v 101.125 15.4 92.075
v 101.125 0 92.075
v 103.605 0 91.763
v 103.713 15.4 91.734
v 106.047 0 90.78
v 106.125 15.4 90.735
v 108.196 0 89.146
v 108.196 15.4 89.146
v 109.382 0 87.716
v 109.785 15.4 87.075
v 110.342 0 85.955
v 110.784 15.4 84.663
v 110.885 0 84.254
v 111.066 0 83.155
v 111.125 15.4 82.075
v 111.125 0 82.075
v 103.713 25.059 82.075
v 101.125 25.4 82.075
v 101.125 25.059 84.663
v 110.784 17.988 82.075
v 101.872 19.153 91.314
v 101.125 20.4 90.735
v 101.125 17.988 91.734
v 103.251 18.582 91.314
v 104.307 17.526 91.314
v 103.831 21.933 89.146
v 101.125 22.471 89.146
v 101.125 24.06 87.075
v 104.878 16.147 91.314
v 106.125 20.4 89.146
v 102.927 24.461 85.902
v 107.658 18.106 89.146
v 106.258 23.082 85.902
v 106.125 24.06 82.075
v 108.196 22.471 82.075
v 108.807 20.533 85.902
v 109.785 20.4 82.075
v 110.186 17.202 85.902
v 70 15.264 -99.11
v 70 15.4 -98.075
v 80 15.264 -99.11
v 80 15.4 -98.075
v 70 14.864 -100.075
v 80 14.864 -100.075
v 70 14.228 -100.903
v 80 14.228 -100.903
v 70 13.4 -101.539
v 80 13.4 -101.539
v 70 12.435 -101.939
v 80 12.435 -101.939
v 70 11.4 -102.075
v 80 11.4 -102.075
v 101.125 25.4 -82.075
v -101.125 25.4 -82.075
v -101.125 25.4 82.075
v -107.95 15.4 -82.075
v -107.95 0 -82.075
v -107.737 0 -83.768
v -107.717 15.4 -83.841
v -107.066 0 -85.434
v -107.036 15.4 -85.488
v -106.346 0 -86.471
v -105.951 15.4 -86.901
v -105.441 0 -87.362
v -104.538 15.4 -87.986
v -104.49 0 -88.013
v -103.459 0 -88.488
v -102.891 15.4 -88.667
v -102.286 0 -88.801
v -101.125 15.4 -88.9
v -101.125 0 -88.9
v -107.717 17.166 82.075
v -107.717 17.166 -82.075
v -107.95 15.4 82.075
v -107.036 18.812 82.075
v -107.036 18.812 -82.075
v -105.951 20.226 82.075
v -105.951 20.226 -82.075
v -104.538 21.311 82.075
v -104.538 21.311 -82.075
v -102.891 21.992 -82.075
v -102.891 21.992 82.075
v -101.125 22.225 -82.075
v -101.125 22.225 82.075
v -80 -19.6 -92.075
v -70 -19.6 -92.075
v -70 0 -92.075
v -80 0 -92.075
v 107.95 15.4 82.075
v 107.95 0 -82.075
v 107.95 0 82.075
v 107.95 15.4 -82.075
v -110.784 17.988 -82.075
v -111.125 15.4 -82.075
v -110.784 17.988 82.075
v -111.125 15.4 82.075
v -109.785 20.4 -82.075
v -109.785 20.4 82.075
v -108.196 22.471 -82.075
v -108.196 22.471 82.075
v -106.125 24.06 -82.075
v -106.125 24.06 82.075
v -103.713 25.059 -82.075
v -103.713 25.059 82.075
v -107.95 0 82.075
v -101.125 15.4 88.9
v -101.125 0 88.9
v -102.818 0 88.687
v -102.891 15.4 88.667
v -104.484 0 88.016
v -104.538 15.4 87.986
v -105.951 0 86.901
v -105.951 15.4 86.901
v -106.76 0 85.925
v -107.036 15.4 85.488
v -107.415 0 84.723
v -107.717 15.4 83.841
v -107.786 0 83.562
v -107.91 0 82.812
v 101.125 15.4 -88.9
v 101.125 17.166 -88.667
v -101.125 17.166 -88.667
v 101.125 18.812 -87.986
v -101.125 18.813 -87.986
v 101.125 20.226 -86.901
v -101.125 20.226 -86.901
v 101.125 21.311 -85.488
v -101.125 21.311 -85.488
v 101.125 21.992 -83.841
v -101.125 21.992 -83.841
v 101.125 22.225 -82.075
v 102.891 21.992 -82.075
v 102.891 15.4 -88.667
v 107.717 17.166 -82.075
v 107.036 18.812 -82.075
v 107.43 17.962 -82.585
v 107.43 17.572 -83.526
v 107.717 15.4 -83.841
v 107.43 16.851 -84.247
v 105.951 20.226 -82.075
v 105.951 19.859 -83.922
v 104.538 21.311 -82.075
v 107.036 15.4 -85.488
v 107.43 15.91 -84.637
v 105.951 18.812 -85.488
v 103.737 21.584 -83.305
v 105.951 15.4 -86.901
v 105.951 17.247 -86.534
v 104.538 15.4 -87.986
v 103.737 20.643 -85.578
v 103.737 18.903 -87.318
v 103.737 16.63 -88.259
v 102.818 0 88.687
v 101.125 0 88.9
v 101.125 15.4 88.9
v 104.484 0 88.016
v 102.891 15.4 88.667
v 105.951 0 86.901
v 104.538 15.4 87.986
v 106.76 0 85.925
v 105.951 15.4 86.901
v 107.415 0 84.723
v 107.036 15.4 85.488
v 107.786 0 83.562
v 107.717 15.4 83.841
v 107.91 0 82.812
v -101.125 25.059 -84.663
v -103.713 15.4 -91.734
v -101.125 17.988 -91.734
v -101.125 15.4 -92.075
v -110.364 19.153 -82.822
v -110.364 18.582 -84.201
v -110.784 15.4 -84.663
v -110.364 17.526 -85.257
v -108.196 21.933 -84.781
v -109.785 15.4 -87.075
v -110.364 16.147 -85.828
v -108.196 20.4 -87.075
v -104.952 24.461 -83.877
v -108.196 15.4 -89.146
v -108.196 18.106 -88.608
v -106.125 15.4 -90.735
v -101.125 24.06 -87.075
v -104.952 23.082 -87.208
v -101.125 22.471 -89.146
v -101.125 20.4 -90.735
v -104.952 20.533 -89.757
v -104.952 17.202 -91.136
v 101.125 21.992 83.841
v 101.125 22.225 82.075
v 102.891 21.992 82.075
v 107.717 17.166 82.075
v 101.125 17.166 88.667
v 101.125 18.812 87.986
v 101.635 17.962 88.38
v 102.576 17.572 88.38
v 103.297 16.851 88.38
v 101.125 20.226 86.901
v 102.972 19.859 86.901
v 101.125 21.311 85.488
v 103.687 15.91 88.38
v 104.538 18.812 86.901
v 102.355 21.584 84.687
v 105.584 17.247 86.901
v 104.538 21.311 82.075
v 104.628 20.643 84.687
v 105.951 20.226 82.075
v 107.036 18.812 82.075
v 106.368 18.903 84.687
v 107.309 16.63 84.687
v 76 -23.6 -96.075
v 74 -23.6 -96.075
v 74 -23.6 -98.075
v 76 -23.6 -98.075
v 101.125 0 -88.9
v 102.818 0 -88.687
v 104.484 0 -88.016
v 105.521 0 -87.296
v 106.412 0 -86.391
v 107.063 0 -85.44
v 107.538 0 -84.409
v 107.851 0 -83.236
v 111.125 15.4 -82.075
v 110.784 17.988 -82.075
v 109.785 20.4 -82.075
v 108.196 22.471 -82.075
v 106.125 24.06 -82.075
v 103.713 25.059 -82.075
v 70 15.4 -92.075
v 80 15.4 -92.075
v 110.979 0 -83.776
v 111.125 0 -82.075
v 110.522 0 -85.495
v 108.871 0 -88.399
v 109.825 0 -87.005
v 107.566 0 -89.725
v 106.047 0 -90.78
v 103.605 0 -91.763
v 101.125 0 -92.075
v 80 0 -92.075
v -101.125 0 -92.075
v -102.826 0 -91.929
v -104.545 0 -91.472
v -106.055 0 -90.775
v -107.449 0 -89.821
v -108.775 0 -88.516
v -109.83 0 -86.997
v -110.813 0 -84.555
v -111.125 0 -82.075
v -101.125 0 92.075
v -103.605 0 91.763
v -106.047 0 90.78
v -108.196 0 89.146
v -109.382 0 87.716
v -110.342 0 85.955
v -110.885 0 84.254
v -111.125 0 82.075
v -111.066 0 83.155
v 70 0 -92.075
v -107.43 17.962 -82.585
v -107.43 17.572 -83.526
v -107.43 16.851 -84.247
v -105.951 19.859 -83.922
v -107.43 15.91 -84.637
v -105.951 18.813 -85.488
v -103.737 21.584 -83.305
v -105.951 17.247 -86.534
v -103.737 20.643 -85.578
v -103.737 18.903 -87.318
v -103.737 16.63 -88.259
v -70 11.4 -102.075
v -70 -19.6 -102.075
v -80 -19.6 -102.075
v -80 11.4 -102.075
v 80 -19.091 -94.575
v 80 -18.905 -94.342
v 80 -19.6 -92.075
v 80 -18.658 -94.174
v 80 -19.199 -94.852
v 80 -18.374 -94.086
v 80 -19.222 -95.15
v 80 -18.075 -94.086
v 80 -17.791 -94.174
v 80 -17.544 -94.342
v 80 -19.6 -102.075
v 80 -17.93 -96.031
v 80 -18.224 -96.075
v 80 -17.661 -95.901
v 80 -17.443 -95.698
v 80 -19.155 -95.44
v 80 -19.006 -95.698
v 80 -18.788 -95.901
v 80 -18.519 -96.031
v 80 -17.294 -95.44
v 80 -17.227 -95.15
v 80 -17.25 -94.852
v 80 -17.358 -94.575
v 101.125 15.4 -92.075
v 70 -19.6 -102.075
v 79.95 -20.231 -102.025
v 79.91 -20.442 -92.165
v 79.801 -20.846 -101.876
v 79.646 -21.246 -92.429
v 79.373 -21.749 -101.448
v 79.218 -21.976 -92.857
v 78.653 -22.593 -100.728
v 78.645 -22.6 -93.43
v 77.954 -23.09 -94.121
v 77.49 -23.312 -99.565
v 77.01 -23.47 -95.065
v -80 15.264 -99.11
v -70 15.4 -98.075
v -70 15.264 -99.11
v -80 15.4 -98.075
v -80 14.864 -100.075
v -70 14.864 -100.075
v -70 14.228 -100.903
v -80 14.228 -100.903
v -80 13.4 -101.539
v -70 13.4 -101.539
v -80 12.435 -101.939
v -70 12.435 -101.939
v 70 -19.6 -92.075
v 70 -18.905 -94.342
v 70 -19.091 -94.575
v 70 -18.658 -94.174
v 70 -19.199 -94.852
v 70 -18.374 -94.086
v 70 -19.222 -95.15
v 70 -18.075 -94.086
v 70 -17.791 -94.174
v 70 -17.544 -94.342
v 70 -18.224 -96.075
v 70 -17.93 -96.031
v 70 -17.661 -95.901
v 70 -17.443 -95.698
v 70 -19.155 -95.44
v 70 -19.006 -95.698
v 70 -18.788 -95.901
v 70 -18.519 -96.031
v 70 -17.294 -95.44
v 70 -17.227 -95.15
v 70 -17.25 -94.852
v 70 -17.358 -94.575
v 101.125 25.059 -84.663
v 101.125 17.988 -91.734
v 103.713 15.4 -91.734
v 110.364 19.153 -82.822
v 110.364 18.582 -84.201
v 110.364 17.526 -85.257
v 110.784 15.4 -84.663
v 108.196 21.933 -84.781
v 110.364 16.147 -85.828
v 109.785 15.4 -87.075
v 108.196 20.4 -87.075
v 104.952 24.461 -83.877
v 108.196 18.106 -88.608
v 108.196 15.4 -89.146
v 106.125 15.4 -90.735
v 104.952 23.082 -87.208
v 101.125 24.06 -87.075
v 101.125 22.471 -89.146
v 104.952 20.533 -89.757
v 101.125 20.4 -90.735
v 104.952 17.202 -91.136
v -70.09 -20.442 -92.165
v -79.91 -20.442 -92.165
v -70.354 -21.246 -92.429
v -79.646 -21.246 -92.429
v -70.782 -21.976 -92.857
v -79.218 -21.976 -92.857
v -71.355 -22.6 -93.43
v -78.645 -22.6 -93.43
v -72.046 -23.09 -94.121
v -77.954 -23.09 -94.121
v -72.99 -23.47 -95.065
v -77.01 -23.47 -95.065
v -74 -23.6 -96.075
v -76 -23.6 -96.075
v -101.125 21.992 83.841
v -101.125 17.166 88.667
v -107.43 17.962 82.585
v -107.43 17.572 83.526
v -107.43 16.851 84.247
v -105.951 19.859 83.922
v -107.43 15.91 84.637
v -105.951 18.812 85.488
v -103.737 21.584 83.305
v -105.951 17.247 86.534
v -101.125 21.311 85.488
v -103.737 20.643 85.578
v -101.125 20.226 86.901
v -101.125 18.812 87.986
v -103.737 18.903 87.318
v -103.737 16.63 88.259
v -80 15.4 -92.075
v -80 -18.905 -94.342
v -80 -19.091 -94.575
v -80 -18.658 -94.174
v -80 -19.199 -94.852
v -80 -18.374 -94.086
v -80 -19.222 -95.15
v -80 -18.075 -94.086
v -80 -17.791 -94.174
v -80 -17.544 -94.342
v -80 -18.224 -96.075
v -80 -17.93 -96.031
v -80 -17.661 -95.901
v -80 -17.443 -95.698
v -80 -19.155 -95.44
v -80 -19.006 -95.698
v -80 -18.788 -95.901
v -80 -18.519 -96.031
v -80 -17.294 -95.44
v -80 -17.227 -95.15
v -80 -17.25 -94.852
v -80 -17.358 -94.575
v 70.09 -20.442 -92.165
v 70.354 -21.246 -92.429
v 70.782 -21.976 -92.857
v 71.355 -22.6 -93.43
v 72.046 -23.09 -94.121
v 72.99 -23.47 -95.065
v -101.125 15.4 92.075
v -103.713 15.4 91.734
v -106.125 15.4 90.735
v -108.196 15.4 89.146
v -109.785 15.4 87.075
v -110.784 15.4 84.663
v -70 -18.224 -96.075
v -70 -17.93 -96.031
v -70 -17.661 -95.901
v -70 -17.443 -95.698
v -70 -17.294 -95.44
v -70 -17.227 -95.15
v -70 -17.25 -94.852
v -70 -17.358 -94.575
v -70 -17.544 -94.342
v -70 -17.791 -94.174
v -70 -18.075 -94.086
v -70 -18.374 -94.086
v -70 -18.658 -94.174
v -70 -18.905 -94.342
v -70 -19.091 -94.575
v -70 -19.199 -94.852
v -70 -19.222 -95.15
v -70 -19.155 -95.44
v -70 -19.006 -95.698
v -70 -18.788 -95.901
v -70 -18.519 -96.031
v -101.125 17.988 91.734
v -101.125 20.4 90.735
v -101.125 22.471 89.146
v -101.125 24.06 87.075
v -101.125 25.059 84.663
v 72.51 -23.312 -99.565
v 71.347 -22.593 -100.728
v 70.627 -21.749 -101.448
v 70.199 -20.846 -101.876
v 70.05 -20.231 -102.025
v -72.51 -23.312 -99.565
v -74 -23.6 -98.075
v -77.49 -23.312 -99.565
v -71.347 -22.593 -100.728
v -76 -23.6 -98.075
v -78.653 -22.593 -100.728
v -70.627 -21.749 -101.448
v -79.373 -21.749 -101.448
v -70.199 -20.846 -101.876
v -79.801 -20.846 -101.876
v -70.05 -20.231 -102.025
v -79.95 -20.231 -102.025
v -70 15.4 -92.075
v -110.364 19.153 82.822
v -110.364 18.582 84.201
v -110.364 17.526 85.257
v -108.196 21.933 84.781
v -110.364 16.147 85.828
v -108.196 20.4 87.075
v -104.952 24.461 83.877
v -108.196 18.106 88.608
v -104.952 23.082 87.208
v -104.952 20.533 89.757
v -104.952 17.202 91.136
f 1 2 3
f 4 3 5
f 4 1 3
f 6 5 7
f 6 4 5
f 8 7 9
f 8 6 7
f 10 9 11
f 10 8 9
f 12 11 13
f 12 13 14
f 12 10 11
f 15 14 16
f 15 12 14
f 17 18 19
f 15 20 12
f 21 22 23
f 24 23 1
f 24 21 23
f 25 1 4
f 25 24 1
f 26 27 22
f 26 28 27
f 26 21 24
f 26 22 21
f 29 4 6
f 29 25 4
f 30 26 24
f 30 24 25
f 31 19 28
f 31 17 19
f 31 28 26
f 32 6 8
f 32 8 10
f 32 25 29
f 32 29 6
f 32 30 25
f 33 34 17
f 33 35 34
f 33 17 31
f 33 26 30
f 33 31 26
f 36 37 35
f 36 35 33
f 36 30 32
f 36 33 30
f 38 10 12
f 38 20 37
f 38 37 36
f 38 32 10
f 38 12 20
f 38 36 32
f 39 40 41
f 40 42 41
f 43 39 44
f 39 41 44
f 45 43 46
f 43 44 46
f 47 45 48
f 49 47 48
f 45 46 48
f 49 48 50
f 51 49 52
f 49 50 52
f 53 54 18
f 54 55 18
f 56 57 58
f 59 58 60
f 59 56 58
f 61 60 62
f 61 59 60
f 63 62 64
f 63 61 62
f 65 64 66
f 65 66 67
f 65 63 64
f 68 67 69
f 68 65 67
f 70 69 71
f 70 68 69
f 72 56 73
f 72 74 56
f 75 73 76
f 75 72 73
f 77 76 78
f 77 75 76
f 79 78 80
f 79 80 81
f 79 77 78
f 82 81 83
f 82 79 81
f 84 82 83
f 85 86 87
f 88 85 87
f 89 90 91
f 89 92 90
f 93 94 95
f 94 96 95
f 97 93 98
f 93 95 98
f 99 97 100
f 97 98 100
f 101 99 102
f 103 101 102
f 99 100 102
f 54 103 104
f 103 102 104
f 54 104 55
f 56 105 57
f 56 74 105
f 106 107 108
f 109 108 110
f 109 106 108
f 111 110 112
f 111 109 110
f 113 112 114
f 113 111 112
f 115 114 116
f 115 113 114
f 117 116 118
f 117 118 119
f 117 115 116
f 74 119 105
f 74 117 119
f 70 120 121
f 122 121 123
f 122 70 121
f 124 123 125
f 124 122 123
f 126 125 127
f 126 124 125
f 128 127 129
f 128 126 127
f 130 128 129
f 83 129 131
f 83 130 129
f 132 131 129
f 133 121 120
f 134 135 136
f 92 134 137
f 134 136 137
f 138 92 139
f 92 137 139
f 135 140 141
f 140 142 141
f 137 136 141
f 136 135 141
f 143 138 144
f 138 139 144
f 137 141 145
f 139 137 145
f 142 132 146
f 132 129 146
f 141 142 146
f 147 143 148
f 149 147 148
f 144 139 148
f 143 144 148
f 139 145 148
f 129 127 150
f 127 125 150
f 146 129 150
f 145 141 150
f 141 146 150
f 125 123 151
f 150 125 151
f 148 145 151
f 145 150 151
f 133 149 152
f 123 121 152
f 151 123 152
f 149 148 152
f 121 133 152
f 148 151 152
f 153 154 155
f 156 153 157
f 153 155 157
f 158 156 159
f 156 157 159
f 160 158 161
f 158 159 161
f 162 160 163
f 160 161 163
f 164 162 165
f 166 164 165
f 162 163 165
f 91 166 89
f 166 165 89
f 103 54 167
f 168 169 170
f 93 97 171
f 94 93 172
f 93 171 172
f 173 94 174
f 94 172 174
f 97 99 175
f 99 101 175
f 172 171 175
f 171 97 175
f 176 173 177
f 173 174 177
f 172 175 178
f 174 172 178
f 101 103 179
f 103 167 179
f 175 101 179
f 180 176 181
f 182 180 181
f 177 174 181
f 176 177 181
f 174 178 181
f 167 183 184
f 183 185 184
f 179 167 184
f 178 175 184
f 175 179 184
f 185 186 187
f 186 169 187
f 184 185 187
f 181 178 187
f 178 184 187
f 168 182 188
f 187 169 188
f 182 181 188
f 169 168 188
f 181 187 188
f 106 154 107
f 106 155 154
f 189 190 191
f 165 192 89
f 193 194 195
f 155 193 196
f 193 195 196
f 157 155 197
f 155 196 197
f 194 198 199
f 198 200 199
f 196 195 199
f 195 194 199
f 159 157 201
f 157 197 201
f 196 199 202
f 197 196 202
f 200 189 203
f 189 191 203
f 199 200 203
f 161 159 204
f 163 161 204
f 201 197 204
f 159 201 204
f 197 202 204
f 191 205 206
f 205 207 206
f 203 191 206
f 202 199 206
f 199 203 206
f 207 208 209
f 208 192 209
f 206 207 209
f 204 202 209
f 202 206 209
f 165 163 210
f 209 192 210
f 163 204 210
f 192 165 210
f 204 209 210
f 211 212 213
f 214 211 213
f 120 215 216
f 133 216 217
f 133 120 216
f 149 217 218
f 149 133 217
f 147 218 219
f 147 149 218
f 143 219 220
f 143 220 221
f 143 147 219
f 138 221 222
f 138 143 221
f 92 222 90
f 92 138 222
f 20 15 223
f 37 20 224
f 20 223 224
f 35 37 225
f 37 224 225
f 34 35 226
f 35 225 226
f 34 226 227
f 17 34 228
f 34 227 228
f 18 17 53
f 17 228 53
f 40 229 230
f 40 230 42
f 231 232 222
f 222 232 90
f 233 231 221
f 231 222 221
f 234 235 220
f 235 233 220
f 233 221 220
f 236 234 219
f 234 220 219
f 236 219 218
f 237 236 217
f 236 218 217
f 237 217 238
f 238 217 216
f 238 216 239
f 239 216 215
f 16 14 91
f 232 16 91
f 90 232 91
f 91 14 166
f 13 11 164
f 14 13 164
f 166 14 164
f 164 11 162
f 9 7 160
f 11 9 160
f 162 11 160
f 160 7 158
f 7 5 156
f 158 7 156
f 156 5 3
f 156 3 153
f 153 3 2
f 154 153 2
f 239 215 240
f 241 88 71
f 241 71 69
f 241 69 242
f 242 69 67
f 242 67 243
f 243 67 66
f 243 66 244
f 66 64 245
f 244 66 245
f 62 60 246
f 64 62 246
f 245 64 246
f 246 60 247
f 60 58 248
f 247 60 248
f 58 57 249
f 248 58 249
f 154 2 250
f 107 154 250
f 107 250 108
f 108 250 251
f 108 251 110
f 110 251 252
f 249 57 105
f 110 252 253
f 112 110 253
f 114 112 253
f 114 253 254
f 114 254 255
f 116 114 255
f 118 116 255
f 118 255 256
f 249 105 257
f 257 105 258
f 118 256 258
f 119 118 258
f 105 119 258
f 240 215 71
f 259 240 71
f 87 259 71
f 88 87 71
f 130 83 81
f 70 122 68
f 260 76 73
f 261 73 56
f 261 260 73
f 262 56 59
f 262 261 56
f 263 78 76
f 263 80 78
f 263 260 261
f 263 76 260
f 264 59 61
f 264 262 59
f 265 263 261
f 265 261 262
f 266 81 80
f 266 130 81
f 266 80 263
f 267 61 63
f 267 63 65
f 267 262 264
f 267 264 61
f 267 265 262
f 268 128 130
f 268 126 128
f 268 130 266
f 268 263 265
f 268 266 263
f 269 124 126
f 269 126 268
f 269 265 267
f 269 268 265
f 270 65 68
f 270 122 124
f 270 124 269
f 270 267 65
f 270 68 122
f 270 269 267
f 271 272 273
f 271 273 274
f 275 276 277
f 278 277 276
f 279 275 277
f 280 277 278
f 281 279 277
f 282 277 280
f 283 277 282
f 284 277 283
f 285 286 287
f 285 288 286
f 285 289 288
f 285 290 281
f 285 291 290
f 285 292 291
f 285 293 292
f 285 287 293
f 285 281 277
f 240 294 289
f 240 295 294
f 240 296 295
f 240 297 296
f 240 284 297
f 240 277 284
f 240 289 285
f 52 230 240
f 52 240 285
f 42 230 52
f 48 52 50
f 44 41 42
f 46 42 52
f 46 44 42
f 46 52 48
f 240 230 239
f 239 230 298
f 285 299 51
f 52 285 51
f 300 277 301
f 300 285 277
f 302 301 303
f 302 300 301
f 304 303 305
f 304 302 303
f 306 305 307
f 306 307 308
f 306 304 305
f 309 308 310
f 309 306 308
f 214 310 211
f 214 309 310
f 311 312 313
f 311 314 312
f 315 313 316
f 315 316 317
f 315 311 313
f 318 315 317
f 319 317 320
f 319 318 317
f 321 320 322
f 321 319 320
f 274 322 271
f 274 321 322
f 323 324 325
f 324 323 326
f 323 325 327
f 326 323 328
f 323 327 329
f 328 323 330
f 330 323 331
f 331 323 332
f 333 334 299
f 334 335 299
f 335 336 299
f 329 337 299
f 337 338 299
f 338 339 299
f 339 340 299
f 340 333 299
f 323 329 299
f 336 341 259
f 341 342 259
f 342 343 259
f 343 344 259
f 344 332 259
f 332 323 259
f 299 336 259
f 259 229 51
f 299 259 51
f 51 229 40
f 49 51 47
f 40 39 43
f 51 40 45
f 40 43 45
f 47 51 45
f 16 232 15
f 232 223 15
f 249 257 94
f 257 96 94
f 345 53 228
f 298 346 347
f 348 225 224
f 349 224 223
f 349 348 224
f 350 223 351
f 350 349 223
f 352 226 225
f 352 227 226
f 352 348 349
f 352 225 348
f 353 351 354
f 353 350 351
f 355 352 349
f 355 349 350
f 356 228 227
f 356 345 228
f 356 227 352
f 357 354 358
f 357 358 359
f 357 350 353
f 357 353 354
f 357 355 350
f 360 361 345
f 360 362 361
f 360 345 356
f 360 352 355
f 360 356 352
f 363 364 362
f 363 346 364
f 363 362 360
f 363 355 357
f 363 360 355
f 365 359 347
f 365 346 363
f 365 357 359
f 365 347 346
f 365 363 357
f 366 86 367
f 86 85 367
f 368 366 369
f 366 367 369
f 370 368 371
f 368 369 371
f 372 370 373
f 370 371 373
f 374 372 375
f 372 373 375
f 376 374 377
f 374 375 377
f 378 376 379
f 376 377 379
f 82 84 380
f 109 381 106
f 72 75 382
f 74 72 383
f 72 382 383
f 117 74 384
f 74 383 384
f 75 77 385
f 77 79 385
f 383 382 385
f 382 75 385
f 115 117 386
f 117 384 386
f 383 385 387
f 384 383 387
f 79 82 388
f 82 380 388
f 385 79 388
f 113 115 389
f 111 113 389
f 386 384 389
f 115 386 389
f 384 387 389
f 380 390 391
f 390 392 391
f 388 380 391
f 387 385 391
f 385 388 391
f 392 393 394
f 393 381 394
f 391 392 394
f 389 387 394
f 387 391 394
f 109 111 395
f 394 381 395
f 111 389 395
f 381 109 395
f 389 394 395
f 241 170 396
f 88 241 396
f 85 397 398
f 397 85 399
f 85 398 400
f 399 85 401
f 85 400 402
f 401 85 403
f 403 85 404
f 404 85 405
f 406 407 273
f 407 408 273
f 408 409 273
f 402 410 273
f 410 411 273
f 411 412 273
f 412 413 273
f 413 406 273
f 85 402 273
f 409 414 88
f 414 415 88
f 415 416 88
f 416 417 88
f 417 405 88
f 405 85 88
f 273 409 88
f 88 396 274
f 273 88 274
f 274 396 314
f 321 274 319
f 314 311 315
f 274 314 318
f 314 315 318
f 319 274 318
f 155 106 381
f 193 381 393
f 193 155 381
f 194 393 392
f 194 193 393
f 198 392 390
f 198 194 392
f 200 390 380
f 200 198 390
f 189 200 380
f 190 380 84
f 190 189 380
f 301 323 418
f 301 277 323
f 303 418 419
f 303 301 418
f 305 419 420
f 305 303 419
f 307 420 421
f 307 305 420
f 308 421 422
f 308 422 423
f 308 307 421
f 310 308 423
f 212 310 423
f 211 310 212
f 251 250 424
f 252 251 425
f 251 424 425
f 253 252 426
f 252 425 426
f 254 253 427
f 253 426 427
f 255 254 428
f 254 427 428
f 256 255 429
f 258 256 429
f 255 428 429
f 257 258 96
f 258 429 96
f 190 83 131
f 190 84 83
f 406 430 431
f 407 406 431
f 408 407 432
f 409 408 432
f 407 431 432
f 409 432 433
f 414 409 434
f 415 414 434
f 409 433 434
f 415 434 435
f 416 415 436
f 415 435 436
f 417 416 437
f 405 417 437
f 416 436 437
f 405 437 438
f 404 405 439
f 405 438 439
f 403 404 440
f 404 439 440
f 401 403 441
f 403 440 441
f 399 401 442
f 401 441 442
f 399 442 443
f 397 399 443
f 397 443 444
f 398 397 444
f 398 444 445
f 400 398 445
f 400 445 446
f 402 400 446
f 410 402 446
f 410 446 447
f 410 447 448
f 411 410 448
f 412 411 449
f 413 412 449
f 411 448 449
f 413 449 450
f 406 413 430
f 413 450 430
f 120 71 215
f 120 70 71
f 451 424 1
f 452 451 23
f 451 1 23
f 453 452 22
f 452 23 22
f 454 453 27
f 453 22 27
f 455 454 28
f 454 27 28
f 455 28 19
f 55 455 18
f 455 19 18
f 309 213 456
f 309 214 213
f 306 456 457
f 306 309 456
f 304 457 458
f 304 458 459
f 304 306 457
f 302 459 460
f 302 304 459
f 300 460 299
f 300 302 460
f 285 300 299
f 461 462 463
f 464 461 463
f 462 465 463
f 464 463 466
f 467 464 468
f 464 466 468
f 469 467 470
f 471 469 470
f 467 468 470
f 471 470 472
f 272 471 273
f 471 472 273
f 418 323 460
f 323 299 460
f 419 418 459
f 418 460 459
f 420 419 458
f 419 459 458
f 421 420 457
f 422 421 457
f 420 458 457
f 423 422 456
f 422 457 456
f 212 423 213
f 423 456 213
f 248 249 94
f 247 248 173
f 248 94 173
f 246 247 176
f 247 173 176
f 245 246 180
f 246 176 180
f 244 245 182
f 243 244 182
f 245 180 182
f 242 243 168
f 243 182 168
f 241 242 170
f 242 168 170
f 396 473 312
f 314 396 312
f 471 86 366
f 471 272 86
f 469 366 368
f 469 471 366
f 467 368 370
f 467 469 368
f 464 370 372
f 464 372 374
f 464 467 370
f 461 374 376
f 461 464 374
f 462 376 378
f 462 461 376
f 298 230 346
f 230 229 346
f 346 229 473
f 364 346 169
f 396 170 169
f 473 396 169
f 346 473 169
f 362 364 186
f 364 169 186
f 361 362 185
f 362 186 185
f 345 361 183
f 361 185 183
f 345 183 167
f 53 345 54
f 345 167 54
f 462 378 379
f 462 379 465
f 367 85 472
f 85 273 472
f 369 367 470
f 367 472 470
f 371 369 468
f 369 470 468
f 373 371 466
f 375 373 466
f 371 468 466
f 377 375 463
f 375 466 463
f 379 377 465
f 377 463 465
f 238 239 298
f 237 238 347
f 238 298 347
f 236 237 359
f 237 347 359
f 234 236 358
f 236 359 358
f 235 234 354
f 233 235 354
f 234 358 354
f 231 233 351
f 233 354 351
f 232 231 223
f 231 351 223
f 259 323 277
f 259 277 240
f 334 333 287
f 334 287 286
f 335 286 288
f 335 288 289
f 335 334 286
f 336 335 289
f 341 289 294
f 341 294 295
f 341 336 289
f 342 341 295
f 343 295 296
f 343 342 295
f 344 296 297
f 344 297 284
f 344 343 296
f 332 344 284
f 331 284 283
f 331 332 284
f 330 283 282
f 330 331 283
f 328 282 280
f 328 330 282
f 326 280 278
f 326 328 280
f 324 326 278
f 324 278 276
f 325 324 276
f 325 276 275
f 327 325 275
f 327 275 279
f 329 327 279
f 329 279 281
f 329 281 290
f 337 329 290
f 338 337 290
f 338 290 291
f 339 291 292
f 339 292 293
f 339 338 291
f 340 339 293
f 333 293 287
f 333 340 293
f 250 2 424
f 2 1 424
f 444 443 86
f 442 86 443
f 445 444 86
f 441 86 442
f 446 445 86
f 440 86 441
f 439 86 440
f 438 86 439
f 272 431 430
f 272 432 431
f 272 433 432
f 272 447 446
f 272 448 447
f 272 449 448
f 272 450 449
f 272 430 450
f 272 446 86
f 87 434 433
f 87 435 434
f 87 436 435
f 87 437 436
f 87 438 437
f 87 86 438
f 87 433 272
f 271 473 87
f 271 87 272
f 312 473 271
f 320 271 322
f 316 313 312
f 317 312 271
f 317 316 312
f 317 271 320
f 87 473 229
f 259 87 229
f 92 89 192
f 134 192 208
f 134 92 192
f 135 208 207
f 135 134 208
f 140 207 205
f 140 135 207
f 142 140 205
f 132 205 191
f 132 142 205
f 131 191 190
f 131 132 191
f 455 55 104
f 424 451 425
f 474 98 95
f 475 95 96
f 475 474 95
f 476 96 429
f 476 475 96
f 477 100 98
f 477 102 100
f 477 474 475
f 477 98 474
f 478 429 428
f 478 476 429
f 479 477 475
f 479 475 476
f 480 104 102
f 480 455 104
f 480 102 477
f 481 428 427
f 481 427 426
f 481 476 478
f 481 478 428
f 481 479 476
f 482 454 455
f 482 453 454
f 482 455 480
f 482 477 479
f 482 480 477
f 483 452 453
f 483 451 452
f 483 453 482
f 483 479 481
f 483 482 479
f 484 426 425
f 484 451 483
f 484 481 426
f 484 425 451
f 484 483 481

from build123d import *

# Parameters (mm, degrees)
FILLET1_R            = 10
SHELL1_T             = -3.175
SKETCH7_W            = 10
SKETCH7_H            = 39
SKETCH7_R            = 1
BOSS_EXTRUDE1_DEPTH  = 10
FILLET2_R            = 4
FILLET2_OF_MIRROR1_R = 4


with BuildPart() as part:
    # Sketch1 → Loft3 section 0
    with BuildSketch(Plane(origin=(0, 0, 0), x_dir=(1, 0, 0), z_dir=(0, 1, 0))):
        with BuildLine():
            Line((111.125, -92.075), (-111.125, -92.075))
            Line((-111.125, -92.075), (-111.125, 92.075))
            Line((-111.125, 92.075), (111.125, 92.075))
            Line((111.125, 92.075), (111.125, -92.075))
        make_face()
    # Sketch2 → Loft3 section 1
    with BuildSketch(Plane(origin=(0, 25.4, 0), x_dir=(1, 0, 0), z_dir=(0, 1, 0))):
        with BuildLine():
            Line((111.125, 92.075), (-111.125, 92.075))
            Line((-111.125, 92.075), (-111.125, -92.075))
            Line((-111.125, -92.075), (111.125, -92.075))
            Line((111.125, -92.075), (111.125, 92.075))
        make_face()
    loft()

    # Fillet1
    fillet1_edges = [part.edges().sort_by_distance(p)[0] for p in [
        (0, 25.4, -92.075),
        (111.125, 25.4, 0),
        (0, 25.4, 92.075),
        (-111.125, 25.4, 0),
        (111.125, 12.7, -92.075),
        (111.125, 12.7, 92.075),
        (-111.125, 12.7, -92.075),
        (-111.125, 12.7, 92.075),
    ]]
    fillet(fillet1_edges, radius=FILLET1_R)

    # Shell1
    shell1_openings = [part.faces().sort_by_distance(p)[0] for p in [
        (-6.8e-08, 0, 8.2e-08),
    ]]
    offset(amount=SHELL1_T, openings=shell1_openings)

    # Sketch7 → Boss-Extrude1 (add)
    with BuildSketch(Plane(origin=(70, 0, 0), x_dir=(0, 0, -1), z_dir=(1, 0, 0))):
        with Locations((97.075, -4.1)):
            Rectangle(SKETCH7_W, SKETCH7_H)
        with Locations((95.075, -18.2245)):
            Circle(SKETCH7_R, mode=Mode.SUBTRACT)
    boss_extrude1 = extrude(amount=BOSS_EXTRUDE1_DEPTH)

    # Fillet2
    fillet2_edges = [part.edges().sort_by_distance(p)[0] for p in [
        (75, -23.6, -102.075),
        (75, 15.4, -102.075),
        (70, -23.6, -97.075),
        (75, -23.6, -92.075),
        (80, -23.6, -97.075),
    ]]
    fillet(fillet2_edges, radius=FILLET2_R)

    # Mirror1: Boss-Extrude1 across plane
    add(boss_extrude1.mirror(Plane(origin=(0, 0, 0), x_dir=(0, 0, 1), z_dir=(1, 0, 0))))

    # Fillet2 of Mirror1
    fillet2_of_mirror1_edges = [part.edges().sort_by_distance(p)[0] for p in [
        (-75, -23.6, -102.075),
        (-75, 15.4, -102.075),
        (-70, -23.6, -97.075),
        (-75, -23.6, -92.075),
        (-80, -23.6, -97.075),
    ]]
    fillet(fillet2_of_mirror1_edges, radius=FILLET2_OF_MIRROR1_R)


solid = part.part
